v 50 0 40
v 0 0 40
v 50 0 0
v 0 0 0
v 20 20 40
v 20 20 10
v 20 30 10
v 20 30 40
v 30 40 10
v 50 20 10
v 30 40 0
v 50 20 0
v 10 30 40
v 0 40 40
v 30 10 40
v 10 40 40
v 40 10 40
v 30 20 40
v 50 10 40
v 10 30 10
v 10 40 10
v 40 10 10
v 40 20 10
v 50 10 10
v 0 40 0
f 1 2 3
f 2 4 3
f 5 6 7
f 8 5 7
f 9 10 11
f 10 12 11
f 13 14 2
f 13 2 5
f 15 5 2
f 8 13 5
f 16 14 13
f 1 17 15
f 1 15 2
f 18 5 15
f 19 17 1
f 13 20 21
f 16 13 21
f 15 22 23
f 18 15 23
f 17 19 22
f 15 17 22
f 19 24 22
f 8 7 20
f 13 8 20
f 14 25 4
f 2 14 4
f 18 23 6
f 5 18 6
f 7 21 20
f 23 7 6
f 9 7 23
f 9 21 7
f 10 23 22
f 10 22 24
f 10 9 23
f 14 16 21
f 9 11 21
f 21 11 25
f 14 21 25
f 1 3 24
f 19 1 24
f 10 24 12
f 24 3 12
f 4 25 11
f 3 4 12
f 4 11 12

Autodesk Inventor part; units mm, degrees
ref_plane "YZ Plane" through (0, 0, 0) normal (1, 0, 0) x (0, 1, 0)
ref_plane "XZ Plane" through (0, 0, 0) normal (0, 1, 0) x (-1, 0, 0)
ref_plane "XY Plane" through (0, 0, 0) normal (0, 0, 1) x (1, 0, 0)
sketch "草圖1" plane through (0, 0, 0) normal (0, 0, 1) x (1, 0, 0)
  line L0 (0, 0) -> (50, 0)
  line L1 (50, 0) -> (50, 20)
  line L2 (50, 20) -> (30, 40)
  line L3 (30, 40) -> (0, 40)
  line L4 (0, 40) -> (0, 0)
  dimension "d0" = 40
  dimension "d1" = 50
  dimension "d2" = 20
  dimension "d3" = 30
extrude "擠出1" add sketch "草圖1" along normal blind 10
sketch "草圖2" plane through (0, 0, 10) normal (0, 0, 1) x (1, 0, 0)
  line L0 (30, 40) -> (0, 40) projected
  line L1 (0, 40) -> (0, 0)
  line L2 (50, 0) -> (50, 20) projected
  line L3 (0, 0) -> (50, 0)
  line L4 (50, 0) -> (50, 10)
  line L5 (50, 10) -> (40, 10)
  line L6 (40, 10) -> (40, 20)
  line L7 (40, 20) -> (20, 20)
  line L8 (20, 20) -> (20, 30)
  line L9 (20, 30) -> (10, 30)
  line L10 (10, 30) -> (10, 40)
  line L11 (10, 40) -> (0, 40)
  dimension "d6" = 10
  dimension "d7" = 10
  dimension "d8" = 10
  dimension "d9" = 10
  dimension "d10" = 20
extrude "擠出2" add sketch "草圖2" along normal blind 30
chamfer "倒角1" distance 10 distance2 30 1 edges at (40, 15, 40) measured on face at (20, 10, 40)
